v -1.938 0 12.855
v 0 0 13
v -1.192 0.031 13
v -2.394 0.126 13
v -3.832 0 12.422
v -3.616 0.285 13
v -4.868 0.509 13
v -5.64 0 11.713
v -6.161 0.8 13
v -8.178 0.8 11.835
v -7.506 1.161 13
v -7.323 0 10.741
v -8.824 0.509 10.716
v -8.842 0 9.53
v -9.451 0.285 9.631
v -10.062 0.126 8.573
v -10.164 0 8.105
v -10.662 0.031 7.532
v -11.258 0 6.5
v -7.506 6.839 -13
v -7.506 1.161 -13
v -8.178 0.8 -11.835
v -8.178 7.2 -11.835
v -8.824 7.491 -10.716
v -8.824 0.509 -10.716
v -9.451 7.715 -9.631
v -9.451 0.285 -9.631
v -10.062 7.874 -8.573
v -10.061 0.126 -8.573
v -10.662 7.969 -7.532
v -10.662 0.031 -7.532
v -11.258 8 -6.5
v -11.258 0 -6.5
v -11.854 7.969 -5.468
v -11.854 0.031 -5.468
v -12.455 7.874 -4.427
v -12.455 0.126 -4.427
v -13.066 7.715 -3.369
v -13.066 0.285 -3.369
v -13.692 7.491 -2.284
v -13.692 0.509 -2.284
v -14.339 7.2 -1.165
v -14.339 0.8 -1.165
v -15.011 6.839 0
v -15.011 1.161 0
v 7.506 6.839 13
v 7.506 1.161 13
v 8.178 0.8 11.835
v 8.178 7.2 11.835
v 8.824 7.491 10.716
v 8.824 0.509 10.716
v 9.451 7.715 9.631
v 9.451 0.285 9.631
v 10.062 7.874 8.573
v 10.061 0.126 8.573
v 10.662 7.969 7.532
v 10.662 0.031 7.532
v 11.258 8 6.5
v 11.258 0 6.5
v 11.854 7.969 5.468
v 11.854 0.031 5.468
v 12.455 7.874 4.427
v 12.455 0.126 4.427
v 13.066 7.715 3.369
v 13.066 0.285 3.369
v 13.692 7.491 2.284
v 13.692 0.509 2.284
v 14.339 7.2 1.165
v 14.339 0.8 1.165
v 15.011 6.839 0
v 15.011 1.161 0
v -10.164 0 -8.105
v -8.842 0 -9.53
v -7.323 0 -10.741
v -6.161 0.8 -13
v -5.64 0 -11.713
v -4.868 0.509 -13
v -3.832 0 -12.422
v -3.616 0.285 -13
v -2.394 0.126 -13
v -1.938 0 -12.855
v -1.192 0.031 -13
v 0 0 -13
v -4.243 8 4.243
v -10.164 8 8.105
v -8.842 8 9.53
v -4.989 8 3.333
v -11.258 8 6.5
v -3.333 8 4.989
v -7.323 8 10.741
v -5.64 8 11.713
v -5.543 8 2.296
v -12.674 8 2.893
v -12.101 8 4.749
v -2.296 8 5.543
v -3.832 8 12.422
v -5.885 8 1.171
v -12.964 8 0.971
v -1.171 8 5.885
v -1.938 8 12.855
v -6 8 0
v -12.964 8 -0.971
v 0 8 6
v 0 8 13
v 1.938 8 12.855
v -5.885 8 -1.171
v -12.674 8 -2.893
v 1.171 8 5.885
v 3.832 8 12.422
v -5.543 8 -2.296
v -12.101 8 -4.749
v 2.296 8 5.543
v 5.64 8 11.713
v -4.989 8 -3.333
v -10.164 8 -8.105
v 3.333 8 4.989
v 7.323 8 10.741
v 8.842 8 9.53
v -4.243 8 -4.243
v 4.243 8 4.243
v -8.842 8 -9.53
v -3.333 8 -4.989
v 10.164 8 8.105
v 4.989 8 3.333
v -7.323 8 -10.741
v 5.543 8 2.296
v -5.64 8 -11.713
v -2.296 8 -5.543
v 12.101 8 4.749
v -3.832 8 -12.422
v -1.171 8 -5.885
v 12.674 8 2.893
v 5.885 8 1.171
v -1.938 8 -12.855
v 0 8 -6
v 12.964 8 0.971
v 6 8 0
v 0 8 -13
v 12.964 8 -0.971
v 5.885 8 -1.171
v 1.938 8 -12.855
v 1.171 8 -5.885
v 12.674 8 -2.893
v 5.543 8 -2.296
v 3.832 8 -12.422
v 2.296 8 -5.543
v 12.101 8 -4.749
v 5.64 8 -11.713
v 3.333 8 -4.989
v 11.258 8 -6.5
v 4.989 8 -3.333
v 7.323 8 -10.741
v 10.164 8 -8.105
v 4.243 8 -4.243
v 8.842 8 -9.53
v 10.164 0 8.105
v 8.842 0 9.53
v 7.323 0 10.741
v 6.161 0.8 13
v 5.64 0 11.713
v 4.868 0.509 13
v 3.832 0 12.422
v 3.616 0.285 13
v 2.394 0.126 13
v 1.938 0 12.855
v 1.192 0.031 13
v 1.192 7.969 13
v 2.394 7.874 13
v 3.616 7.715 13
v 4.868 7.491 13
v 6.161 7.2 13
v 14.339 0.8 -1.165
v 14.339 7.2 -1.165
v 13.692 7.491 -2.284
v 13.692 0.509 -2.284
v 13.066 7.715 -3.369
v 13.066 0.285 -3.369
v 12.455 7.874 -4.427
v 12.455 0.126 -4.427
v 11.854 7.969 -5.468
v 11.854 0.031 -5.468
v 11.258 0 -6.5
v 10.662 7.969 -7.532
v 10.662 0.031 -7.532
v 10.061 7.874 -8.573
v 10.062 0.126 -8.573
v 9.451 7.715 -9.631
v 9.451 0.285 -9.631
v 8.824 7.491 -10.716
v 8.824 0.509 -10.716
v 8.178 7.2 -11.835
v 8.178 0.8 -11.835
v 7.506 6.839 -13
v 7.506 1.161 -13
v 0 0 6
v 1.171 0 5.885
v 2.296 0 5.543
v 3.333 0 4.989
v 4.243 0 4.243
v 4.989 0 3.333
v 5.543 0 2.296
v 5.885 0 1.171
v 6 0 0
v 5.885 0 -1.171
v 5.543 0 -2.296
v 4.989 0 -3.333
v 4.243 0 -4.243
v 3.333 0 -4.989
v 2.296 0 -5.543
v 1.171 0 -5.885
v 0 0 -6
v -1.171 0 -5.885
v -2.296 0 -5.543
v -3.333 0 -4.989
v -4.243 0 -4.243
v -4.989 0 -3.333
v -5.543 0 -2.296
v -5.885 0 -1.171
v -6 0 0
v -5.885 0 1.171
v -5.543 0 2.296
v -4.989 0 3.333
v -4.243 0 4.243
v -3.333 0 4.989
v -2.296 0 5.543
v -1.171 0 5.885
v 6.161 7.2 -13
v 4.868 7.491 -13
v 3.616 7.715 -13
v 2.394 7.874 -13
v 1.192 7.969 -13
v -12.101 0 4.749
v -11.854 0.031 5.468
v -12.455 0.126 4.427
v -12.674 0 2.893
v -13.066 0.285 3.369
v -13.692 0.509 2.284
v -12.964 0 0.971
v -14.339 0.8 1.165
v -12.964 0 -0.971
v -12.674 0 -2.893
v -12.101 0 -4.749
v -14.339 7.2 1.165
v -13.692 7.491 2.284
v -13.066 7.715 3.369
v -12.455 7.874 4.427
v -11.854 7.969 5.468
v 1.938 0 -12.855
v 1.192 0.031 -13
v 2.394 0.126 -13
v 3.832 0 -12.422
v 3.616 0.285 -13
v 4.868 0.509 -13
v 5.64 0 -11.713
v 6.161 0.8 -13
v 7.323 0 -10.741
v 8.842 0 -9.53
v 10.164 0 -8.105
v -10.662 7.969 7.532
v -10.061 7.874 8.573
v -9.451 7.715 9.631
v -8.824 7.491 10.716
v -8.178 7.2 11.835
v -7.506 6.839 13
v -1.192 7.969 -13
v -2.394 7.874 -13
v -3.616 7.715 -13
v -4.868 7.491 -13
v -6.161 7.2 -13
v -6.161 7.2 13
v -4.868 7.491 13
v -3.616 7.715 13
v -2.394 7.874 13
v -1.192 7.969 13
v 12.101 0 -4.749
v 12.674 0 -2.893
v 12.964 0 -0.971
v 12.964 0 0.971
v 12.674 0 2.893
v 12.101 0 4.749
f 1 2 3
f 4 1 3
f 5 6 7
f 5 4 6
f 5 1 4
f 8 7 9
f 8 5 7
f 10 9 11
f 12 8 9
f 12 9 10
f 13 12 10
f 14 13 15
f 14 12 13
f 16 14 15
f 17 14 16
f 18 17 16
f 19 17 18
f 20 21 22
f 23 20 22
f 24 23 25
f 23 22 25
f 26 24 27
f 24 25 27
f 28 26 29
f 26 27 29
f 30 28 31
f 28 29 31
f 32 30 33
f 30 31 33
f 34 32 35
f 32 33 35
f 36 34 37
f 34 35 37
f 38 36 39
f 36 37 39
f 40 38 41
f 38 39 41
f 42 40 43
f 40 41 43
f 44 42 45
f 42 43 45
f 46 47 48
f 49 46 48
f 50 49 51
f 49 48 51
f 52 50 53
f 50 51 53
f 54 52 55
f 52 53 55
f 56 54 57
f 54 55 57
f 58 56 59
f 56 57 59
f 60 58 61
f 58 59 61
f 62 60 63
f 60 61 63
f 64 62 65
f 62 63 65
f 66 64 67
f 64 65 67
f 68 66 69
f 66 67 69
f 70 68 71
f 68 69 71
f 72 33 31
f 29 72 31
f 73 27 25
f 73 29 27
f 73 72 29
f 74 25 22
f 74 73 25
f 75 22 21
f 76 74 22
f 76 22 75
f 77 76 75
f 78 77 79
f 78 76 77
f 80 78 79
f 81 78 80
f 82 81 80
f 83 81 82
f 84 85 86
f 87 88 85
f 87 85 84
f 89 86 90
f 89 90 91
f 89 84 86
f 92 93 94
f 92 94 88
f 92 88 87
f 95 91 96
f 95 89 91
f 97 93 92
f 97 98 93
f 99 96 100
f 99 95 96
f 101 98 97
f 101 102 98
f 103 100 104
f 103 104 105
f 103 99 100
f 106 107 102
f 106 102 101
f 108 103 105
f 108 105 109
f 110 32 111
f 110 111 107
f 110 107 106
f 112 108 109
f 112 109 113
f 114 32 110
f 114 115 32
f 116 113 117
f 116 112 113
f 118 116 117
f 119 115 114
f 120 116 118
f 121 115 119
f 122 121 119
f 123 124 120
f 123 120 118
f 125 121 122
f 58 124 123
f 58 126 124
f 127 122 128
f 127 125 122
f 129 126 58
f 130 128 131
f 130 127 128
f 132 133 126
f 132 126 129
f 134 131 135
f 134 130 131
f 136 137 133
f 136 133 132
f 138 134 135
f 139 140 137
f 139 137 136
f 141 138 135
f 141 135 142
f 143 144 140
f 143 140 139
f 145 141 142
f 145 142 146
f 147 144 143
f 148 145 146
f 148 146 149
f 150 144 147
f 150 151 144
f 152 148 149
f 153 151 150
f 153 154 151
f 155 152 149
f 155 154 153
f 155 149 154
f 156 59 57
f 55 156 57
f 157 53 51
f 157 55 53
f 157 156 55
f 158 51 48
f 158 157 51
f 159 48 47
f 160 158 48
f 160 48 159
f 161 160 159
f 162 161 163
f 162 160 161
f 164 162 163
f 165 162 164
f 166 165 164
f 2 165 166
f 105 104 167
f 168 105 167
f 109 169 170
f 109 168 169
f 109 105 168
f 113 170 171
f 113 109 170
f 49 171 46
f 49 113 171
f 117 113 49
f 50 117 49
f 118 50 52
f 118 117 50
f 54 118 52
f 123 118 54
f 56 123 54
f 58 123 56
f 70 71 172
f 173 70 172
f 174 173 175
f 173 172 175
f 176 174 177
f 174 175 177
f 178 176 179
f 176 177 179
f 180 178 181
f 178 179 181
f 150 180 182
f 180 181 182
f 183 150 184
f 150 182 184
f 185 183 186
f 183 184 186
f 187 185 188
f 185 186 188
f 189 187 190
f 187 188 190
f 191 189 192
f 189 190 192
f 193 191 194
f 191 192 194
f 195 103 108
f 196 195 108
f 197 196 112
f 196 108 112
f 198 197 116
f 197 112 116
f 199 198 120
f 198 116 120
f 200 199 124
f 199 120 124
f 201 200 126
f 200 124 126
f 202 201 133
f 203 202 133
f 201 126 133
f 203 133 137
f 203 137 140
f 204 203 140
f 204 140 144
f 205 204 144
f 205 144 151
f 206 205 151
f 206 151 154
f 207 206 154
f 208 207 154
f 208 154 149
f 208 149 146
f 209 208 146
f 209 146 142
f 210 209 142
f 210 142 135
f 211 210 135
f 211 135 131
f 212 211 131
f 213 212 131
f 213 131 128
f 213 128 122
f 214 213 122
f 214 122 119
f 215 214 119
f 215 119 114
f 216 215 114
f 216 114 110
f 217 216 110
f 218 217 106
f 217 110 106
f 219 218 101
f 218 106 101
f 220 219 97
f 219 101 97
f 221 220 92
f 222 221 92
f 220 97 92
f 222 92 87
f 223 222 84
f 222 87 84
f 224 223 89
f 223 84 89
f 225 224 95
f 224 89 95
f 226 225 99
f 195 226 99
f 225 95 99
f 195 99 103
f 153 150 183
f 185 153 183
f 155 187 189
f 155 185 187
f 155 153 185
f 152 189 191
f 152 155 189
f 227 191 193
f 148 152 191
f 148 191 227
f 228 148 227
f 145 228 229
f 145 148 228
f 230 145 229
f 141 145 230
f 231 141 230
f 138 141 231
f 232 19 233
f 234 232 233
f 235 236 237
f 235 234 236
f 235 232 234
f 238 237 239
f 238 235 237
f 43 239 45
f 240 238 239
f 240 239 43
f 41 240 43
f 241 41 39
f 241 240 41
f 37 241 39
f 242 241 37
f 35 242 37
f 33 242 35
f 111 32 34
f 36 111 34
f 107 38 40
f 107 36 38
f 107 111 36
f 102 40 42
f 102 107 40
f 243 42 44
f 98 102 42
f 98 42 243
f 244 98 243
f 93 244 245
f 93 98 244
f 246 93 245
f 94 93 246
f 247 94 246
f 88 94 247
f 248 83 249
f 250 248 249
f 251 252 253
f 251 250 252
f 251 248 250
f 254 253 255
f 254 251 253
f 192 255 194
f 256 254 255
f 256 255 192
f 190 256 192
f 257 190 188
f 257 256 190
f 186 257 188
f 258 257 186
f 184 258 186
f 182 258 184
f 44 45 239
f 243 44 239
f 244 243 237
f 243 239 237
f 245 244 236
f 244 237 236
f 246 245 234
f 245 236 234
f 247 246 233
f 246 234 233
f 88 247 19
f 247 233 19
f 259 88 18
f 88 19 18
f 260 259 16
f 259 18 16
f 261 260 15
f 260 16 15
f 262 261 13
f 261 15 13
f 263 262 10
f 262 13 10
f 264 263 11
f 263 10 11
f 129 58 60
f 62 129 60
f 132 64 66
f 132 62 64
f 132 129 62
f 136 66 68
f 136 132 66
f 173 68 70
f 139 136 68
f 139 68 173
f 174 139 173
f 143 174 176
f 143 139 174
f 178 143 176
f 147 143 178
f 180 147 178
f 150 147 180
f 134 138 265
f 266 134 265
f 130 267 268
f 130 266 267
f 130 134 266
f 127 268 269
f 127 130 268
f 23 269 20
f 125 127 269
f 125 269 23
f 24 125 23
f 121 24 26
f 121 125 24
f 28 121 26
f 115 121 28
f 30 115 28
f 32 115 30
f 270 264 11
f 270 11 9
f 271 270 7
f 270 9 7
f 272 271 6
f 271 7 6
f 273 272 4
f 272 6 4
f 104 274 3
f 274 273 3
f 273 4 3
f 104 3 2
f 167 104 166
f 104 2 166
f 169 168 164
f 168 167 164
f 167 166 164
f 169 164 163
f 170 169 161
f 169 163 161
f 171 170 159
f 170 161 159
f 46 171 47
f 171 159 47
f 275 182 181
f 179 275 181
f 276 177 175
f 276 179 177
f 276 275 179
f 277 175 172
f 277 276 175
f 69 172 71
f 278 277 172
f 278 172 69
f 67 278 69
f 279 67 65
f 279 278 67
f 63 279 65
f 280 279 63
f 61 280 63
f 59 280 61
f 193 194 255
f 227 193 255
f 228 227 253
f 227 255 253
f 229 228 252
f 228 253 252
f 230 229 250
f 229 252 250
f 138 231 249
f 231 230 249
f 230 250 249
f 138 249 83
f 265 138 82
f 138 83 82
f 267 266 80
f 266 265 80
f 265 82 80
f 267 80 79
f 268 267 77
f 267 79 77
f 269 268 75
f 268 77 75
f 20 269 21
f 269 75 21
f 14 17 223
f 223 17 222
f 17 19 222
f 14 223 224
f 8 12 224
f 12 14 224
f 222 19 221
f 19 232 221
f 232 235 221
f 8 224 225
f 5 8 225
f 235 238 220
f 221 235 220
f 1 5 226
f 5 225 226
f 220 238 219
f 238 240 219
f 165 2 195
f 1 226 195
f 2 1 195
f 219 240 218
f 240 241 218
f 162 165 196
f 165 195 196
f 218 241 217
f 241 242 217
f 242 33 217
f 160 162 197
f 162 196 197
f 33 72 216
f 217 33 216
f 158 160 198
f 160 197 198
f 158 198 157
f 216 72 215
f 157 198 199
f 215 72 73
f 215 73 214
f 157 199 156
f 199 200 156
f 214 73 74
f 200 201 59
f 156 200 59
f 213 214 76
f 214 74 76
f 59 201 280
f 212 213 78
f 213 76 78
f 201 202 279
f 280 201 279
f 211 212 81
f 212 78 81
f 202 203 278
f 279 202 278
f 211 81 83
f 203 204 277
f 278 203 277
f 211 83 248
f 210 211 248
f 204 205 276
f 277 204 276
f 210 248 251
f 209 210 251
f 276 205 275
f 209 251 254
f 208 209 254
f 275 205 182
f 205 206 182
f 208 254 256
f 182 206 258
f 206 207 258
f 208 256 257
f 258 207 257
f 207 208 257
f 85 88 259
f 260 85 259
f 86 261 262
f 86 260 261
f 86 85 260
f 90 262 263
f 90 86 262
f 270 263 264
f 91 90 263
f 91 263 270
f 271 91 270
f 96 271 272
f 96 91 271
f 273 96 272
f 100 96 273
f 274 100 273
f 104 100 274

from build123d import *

# Parameters (mm, degrees)
BOSS_EXTRUDE1_DEPTH     = 8
SKETCH2_R               = 6
CUT_EXTRUDE1_DEPTH      = 22.408720964
SKETCH3_OUTSIDE_W       = 67.838
SKETCH3_OUTSIDE_H       = 63.816
SKETCH3_OUTSIDE_R       = 13
CUT_EXTRUDE2_DEPTH      = 8
CUT_EXTRUDE2_DRAFT      = -60
MIRROR1_COPY_1_SKETCH_W = 67.838
MIRROR1_COPY_1_SKETCH_H = 63.816
MIRROR1_COPY_1_SKETCH_R = 13
MIRROR1_COPY_1_DEPTH    = 8
MIRROR1_COPY_1_DRAFT    = -60


with BuildPart() as part:
    # Sketch1 → Boss-Extrude1 (new body)
    with BuildSketch(Plane(origin=(0, 0, 0), x_dir=(1, 0, 0), z_dir=(0, 1, 0))):
        Polygon((7.505553499, -13), (15.011106999, 0), (7.505553499, 13), (-7.505553499, 13), (-15.011106999, 0), (-7.505553499, -13), align=None)
    extrude(amount=BOSS_EXTRUDE1_DEPTH)

    # Sketch2 → Cut-Extrude1 (cut, through all)
    with BuildSketch(Plane(origin=(0, 8, 0), x_dir=(1, 0, 0), z_dir=(0, 1, 0))):
        with Locations(Location((0, 0, 0), (0, 0, 270))):
            Circle(SKETCH2_R)
    extrude(amount=-CUT_EXTRUDE1_DEPTH, mode=Mode.SUBTRACT)


with BuildPart() as cut_extrude2_tool:
    # Sketch3 outside → Cut-Extrude2 (with draft: the straight prism first)
    with BuildSketch(Plane(origin=(0, 8, 0), x_dir=(1, 0, 0), z_dir=(0, 1, 0))):
        Rectangle(SKETCH3_OUTSIDE_W, SKETCH3_OUTSIDE_H)
        Circle(SKETCH3_OUTSIDE_R, mode=Mode.SUBTRACT)
    extrude(amount=-CUT_EXTRUDE2_DEPTH)
    # Cut-Extrude2: the draft: its side faces are tilted about the plane it starts from
    cut_extrude2_sides = [cut_extrude2_tool.faces().sort_by_distance(p)[0] for p in [
        (0, 4, 31.908),
        (33.919, 4, 0),
        (0, 4, -31.908),
        (-33.919, 4, 0),
        (-13, 4, 0),
    ]]
    draft(cut_extrude2_sides, Plane(origin=(0, 8, 0), x_dir=(1, 0, 0), z_dir=(0, 1, 0)), CUT_EXTRUDE2_DRAFT)


with BuildPart() as part_1:
    add(part.part)

    # Cut-Extrude2: cut by cut_extrude2_tool
    add(cut_extrude2_tool.part, mode=Mode.SUBTRACT)


with BuildPart() as mirror1_copy_1_tool:
    # Mirror1 copy 1 sketch → Mirror1 copy 1 (with draft: the straight prism first)
    with BuildSketch(Plane.XZ):
        Rectangle(MIRROR1_COPY_1_SKETCH_W, MIRROR1_COPY_1_SKETCH_H)
        Circle(MIRROR1_COPY_1_SKETCH_R, mode=Mode.SUBTRACT)
    extrude(amount=-MIRROR1_COPY_1_DEPTH)
    # Mirror1 copy 1: the draft: its side faces are tilted about the plane it starts from
    mirror1_copy_1_sides = [mirror1_copy_1_tool.faces().sort_by_distance(p)[0] for p in [
        (0, 4, 31.908),
        (33.919, 4, 0),
        (0, 4, -31.908),
        (-33.919, 4, 0),
        (-13, 4, 0),
    ]]
    draft(mirror1_copy_1_sides, Plane.XZ, MIRROR1_COPY_1_DRAFT)


with BuildPart() as part_2:
    add(part_1.part)

    # Mirror1 copy 1: cut by mirror1_copy_1_tool
    add(mirror1_copy_1_tool.part, mode=Mode.SUBTRACT)


solid = part_2.part
